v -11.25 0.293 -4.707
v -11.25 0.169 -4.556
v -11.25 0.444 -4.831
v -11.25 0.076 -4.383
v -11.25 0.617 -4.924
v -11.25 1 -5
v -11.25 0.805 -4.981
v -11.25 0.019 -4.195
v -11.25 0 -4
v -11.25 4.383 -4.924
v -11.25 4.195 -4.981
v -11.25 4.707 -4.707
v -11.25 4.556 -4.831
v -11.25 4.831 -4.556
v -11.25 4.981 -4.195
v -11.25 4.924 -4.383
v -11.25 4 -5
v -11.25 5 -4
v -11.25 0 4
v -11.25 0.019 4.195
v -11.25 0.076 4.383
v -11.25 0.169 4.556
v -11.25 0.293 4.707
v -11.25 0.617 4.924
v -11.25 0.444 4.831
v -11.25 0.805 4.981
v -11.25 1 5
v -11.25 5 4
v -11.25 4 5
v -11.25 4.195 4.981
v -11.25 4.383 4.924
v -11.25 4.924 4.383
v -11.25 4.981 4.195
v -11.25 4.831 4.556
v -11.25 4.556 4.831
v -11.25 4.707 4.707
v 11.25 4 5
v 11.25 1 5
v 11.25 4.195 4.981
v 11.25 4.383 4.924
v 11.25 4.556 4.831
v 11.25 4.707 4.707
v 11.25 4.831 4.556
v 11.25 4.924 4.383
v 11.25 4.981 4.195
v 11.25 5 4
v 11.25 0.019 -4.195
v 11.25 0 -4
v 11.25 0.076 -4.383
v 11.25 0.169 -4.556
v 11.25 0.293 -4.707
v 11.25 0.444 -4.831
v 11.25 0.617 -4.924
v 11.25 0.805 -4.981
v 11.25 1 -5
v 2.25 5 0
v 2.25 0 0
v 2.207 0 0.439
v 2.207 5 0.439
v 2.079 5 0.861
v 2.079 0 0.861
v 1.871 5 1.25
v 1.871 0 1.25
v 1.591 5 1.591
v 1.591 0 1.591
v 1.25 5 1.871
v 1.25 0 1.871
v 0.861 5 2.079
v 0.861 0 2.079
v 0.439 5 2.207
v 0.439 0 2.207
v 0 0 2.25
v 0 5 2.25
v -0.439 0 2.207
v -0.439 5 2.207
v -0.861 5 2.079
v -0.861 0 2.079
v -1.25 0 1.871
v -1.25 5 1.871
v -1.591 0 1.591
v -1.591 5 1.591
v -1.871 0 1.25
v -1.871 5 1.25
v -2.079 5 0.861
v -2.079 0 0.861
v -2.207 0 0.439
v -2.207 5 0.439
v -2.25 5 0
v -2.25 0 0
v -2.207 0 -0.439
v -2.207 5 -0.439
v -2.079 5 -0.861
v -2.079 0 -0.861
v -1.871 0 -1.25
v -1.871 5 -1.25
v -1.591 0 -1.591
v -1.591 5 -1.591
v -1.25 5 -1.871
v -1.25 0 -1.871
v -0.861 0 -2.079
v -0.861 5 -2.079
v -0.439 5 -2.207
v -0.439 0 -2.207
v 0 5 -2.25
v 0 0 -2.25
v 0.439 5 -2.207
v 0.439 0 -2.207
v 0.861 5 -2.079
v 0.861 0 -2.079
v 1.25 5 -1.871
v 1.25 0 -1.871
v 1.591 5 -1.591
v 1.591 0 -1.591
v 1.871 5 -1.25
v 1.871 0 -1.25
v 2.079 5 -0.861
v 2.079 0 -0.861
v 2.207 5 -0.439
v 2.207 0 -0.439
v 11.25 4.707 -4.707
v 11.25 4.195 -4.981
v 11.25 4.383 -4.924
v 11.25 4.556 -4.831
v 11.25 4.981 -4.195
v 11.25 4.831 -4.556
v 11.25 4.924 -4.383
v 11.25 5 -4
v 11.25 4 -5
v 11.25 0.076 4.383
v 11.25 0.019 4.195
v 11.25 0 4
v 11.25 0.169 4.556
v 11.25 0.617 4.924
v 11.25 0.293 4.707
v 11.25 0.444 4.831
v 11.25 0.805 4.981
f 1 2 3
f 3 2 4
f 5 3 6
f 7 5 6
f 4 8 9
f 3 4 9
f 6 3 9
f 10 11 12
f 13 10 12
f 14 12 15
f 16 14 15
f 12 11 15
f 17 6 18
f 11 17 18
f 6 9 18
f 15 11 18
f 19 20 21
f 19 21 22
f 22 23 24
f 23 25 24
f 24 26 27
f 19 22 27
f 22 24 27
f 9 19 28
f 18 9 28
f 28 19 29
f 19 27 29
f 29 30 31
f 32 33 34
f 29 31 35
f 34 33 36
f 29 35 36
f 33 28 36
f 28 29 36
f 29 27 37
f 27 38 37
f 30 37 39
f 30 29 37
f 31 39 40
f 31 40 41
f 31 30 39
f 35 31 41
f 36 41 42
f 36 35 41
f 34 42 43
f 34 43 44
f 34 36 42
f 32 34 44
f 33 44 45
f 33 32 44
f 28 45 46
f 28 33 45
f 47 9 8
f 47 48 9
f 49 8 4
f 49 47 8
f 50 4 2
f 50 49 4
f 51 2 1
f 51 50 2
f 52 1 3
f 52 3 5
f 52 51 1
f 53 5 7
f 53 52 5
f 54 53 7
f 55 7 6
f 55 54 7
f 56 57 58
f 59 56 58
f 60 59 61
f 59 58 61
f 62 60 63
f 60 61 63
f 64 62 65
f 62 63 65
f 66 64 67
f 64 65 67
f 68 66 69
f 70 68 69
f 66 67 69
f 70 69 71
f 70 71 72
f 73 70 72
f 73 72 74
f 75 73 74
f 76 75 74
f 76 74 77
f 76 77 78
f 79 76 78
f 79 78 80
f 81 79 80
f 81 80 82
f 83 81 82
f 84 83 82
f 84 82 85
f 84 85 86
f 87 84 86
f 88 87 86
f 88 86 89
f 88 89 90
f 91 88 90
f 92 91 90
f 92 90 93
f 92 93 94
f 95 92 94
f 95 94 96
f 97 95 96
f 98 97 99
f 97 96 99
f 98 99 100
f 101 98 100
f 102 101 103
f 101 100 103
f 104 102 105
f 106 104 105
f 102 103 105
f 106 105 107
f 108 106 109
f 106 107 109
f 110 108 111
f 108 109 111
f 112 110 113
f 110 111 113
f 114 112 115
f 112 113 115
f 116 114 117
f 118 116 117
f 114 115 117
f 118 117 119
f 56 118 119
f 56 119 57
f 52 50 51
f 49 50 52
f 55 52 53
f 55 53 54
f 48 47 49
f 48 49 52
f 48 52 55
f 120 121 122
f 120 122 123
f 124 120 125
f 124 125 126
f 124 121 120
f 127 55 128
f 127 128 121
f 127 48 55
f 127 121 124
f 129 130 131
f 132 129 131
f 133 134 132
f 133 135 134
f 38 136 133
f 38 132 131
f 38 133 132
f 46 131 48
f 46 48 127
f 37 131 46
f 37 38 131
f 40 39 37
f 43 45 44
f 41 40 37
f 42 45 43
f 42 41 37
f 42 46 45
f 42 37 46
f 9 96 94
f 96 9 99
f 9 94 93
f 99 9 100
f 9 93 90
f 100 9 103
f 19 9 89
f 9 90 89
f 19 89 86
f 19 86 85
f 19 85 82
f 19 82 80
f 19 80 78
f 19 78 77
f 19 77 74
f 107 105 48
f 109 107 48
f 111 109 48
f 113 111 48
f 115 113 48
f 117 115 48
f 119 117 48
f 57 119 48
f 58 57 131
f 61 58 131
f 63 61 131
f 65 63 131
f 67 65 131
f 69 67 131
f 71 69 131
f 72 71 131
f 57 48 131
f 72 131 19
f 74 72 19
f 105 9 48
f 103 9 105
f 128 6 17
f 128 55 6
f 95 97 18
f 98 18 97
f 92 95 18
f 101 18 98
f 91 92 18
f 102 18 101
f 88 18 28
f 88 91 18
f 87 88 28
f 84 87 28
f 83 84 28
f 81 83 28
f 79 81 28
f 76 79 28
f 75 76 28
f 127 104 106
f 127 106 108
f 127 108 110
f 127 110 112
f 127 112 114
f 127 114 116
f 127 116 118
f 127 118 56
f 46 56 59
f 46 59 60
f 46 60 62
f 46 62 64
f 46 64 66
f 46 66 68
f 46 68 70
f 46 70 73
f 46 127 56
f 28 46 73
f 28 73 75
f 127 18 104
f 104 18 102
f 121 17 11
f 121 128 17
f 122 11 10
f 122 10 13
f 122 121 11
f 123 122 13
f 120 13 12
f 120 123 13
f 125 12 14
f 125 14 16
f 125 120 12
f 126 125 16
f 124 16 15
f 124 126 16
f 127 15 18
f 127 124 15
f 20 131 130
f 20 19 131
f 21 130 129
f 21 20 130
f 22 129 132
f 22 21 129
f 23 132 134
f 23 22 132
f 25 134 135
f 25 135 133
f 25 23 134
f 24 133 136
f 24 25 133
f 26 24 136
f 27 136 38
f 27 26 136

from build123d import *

# Parameters (mm, degrees)
F0_W     = 5
F0_H     = 10
F1_DEPTH = 11.25
F2_R     = 2.25
F3_DEPTH = 5.001
F4_R     = 1


with BuildPart() as f1:
    # F0 (on Right) → F1 (new body, symmetric)
    with BuildSketch(Plane.YZ):
        with Locations((2.5, 0)):
            Rectangle(F0_W, F0_H)
    extrude(amount=F1_DEPTH, both=True)

    # F2 (on face) → F3 (cut, through all)
    with BuildSketch(Plane.XZ):
        Circle(F2_R)
    extrude(amount=-F3_DEPTH, mode=Mode.SUBTRACT)

    # F4
    f4_edges = [f1.edges().sort_by_distance(p)[0] for p in [
        (0, 0, 5),
        (0, 0, -5),
        (0, 5, 5),
        (0, 5, -5),
    ]]
    fillet(f4_edges, radius=F4_R)


solid = f1.part
